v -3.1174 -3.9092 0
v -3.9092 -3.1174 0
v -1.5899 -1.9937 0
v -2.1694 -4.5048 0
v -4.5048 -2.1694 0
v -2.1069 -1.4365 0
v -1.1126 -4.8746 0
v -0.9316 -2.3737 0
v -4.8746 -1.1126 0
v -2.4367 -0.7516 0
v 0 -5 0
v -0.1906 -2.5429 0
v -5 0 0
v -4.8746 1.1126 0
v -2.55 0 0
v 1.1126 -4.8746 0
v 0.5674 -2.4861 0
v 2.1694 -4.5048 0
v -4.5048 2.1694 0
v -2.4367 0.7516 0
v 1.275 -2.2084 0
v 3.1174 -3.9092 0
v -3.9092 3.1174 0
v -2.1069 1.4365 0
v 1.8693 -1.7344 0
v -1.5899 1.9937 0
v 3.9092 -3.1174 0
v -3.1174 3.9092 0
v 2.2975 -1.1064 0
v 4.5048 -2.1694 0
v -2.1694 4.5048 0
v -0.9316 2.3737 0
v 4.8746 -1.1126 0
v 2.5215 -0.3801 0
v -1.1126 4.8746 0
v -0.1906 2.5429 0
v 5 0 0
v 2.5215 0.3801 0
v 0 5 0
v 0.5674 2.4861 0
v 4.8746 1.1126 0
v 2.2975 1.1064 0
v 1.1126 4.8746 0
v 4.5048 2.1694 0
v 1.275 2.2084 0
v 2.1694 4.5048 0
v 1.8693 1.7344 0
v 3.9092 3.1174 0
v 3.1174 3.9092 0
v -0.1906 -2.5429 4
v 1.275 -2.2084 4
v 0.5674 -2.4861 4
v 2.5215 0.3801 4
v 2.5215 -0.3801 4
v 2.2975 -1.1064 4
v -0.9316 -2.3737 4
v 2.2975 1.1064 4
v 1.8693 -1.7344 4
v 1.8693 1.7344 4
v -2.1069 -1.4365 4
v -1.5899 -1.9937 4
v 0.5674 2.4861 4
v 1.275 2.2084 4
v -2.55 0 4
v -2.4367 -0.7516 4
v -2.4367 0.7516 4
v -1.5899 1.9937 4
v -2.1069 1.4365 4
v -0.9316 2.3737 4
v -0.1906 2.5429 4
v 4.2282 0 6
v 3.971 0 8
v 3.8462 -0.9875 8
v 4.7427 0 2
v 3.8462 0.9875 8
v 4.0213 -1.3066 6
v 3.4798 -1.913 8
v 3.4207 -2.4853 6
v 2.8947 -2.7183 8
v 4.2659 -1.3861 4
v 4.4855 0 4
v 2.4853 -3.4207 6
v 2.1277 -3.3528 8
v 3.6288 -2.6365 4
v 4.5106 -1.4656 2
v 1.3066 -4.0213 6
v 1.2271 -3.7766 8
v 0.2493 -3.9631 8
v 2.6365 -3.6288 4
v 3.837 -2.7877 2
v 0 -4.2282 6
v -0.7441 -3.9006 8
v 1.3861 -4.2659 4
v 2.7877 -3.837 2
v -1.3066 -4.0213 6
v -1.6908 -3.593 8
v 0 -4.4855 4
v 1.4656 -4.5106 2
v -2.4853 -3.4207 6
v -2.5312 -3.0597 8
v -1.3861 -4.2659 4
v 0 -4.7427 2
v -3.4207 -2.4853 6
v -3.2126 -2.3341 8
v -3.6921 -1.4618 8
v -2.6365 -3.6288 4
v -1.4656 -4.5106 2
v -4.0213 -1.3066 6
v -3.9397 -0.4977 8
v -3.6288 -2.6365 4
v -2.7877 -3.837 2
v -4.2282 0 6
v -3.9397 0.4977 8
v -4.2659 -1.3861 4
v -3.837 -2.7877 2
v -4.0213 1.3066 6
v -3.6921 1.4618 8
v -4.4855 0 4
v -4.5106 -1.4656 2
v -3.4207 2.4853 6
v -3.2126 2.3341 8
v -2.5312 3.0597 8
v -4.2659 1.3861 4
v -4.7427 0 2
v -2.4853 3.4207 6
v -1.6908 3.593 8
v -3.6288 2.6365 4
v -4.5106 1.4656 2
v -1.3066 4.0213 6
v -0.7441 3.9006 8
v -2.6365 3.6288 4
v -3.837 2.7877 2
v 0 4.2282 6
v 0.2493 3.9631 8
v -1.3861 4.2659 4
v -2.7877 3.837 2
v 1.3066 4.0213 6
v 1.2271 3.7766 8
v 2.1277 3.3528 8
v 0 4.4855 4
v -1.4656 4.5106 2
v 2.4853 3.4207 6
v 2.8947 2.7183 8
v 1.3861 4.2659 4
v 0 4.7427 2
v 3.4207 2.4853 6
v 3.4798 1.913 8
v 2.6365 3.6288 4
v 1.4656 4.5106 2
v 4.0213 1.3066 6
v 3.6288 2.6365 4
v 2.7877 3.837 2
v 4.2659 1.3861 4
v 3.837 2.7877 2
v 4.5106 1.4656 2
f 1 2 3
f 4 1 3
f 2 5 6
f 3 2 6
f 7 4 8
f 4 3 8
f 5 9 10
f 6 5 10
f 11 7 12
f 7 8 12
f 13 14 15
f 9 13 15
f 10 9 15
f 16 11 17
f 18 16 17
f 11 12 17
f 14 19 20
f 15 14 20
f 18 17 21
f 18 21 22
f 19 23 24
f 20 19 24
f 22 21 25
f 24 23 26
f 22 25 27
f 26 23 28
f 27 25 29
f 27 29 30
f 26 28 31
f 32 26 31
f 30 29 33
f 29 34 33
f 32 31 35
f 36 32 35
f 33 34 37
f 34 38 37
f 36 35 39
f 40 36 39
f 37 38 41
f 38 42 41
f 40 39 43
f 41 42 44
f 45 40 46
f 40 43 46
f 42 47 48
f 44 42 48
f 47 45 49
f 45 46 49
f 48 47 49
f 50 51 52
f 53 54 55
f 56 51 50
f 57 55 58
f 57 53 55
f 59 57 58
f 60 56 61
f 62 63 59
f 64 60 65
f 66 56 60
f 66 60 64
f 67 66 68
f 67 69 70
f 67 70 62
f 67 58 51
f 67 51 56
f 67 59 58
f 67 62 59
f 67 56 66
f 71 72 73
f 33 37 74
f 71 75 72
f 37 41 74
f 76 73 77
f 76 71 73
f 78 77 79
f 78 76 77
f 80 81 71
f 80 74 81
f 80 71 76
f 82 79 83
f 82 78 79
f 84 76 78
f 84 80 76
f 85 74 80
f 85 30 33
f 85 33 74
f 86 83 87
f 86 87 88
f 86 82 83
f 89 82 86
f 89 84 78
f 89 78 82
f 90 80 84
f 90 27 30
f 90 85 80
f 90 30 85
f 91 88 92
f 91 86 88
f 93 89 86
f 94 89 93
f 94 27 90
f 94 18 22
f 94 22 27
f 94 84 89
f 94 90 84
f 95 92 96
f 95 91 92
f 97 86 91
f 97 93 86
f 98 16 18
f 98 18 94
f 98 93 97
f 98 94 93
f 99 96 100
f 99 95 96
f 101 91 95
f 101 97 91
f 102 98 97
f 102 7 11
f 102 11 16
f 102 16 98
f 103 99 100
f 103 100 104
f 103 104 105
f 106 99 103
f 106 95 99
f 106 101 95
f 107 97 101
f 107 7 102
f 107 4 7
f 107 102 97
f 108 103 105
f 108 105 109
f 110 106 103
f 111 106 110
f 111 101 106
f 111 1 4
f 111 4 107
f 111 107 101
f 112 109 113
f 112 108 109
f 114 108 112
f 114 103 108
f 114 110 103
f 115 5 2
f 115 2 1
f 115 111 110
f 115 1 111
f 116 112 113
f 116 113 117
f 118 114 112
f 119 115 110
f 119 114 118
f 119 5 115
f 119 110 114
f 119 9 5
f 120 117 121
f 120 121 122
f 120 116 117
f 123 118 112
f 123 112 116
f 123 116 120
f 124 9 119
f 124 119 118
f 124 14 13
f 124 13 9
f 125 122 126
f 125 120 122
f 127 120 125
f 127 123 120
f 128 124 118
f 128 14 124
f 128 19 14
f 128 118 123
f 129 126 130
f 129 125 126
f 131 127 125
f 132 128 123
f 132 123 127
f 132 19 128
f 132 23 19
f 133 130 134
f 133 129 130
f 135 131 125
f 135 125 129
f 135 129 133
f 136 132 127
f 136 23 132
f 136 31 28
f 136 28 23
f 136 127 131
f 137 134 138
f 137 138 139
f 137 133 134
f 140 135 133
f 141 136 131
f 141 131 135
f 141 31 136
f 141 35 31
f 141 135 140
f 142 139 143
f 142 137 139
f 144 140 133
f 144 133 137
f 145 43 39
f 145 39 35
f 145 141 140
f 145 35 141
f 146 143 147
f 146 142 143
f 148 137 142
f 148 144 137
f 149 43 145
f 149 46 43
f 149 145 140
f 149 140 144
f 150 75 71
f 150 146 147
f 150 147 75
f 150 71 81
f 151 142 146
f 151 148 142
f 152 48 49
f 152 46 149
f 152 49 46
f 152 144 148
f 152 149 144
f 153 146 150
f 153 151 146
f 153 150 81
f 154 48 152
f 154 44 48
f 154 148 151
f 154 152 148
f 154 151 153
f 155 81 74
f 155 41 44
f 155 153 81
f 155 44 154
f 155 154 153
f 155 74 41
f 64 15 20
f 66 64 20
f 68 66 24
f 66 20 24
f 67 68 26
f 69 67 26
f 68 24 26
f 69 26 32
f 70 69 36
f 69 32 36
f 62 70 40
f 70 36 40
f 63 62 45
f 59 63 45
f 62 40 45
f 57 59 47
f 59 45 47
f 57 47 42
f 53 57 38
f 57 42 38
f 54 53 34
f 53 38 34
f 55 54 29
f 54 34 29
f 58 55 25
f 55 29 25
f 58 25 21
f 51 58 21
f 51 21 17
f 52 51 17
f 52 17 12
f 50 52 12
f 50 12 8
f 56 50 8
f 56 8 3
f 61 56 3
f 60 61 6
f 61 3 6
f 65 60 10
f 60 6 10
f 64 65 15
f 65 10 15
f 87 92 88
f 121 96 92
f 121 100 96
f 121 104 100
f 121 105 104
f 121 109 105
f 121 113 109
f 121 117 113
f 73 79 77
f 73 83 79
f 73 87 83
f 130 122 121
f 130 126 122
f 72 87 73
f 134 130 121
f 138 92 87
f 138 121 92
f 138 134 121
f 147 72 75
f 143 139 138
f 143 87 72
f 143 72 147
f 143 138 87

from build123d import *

# Parameters (mm, degrees)
CROQUIS1_R              = 5
SALIENTE_EXTRUIR1_DEPTH = 8
CROQUIS4_R              = 2.55
CORTAR_EXTRUIR1_DEPTH   = 4


with BuildPart() as part:
    # Croquis1 → Saliente-Extruir1 (new body)
    with BuildSketch(Plane.XY):
        Circle(CROQUIS1_R)
    extrude(amount=SALIENTE_EXTRUIR1_DEPTH)

    # Croquis3 → Cortar-Revolución2 (revolve, cut)
    with BuildSketch(Plane(origin=(0, 0, 0), x_dir=(0, 0, -1), z_dir=(1, 0, 0)), mode=Mode.PRIVATE) as cortar_revoluci_n2_sk:
        Polygon((-8, 3.970963049), (0, 5), (-8, 5), align=None)
    revolve(cortar_revoluci_n2_sk.sketch.rotate(Axis((0, 0, 8), (0, 0, -1)), 90), axis=Axis((0, 0, 8), (0, 0, -1)), mode=Mode.SUBTRACT)

    # Croquis4 → Cortar-Extruir1 (cut)
    with BuildSketch(Plane(origin=(0, 0, 0), x_dir=(-1, 0, 0), z_dir=(0, 0, -1))):
        Circle(CROQUIS4_R)
    extrude(amount=-CORTAR_EXTRUIR1_DEPTH, mode=Mode.SUBTRACT)


solid = part.part
